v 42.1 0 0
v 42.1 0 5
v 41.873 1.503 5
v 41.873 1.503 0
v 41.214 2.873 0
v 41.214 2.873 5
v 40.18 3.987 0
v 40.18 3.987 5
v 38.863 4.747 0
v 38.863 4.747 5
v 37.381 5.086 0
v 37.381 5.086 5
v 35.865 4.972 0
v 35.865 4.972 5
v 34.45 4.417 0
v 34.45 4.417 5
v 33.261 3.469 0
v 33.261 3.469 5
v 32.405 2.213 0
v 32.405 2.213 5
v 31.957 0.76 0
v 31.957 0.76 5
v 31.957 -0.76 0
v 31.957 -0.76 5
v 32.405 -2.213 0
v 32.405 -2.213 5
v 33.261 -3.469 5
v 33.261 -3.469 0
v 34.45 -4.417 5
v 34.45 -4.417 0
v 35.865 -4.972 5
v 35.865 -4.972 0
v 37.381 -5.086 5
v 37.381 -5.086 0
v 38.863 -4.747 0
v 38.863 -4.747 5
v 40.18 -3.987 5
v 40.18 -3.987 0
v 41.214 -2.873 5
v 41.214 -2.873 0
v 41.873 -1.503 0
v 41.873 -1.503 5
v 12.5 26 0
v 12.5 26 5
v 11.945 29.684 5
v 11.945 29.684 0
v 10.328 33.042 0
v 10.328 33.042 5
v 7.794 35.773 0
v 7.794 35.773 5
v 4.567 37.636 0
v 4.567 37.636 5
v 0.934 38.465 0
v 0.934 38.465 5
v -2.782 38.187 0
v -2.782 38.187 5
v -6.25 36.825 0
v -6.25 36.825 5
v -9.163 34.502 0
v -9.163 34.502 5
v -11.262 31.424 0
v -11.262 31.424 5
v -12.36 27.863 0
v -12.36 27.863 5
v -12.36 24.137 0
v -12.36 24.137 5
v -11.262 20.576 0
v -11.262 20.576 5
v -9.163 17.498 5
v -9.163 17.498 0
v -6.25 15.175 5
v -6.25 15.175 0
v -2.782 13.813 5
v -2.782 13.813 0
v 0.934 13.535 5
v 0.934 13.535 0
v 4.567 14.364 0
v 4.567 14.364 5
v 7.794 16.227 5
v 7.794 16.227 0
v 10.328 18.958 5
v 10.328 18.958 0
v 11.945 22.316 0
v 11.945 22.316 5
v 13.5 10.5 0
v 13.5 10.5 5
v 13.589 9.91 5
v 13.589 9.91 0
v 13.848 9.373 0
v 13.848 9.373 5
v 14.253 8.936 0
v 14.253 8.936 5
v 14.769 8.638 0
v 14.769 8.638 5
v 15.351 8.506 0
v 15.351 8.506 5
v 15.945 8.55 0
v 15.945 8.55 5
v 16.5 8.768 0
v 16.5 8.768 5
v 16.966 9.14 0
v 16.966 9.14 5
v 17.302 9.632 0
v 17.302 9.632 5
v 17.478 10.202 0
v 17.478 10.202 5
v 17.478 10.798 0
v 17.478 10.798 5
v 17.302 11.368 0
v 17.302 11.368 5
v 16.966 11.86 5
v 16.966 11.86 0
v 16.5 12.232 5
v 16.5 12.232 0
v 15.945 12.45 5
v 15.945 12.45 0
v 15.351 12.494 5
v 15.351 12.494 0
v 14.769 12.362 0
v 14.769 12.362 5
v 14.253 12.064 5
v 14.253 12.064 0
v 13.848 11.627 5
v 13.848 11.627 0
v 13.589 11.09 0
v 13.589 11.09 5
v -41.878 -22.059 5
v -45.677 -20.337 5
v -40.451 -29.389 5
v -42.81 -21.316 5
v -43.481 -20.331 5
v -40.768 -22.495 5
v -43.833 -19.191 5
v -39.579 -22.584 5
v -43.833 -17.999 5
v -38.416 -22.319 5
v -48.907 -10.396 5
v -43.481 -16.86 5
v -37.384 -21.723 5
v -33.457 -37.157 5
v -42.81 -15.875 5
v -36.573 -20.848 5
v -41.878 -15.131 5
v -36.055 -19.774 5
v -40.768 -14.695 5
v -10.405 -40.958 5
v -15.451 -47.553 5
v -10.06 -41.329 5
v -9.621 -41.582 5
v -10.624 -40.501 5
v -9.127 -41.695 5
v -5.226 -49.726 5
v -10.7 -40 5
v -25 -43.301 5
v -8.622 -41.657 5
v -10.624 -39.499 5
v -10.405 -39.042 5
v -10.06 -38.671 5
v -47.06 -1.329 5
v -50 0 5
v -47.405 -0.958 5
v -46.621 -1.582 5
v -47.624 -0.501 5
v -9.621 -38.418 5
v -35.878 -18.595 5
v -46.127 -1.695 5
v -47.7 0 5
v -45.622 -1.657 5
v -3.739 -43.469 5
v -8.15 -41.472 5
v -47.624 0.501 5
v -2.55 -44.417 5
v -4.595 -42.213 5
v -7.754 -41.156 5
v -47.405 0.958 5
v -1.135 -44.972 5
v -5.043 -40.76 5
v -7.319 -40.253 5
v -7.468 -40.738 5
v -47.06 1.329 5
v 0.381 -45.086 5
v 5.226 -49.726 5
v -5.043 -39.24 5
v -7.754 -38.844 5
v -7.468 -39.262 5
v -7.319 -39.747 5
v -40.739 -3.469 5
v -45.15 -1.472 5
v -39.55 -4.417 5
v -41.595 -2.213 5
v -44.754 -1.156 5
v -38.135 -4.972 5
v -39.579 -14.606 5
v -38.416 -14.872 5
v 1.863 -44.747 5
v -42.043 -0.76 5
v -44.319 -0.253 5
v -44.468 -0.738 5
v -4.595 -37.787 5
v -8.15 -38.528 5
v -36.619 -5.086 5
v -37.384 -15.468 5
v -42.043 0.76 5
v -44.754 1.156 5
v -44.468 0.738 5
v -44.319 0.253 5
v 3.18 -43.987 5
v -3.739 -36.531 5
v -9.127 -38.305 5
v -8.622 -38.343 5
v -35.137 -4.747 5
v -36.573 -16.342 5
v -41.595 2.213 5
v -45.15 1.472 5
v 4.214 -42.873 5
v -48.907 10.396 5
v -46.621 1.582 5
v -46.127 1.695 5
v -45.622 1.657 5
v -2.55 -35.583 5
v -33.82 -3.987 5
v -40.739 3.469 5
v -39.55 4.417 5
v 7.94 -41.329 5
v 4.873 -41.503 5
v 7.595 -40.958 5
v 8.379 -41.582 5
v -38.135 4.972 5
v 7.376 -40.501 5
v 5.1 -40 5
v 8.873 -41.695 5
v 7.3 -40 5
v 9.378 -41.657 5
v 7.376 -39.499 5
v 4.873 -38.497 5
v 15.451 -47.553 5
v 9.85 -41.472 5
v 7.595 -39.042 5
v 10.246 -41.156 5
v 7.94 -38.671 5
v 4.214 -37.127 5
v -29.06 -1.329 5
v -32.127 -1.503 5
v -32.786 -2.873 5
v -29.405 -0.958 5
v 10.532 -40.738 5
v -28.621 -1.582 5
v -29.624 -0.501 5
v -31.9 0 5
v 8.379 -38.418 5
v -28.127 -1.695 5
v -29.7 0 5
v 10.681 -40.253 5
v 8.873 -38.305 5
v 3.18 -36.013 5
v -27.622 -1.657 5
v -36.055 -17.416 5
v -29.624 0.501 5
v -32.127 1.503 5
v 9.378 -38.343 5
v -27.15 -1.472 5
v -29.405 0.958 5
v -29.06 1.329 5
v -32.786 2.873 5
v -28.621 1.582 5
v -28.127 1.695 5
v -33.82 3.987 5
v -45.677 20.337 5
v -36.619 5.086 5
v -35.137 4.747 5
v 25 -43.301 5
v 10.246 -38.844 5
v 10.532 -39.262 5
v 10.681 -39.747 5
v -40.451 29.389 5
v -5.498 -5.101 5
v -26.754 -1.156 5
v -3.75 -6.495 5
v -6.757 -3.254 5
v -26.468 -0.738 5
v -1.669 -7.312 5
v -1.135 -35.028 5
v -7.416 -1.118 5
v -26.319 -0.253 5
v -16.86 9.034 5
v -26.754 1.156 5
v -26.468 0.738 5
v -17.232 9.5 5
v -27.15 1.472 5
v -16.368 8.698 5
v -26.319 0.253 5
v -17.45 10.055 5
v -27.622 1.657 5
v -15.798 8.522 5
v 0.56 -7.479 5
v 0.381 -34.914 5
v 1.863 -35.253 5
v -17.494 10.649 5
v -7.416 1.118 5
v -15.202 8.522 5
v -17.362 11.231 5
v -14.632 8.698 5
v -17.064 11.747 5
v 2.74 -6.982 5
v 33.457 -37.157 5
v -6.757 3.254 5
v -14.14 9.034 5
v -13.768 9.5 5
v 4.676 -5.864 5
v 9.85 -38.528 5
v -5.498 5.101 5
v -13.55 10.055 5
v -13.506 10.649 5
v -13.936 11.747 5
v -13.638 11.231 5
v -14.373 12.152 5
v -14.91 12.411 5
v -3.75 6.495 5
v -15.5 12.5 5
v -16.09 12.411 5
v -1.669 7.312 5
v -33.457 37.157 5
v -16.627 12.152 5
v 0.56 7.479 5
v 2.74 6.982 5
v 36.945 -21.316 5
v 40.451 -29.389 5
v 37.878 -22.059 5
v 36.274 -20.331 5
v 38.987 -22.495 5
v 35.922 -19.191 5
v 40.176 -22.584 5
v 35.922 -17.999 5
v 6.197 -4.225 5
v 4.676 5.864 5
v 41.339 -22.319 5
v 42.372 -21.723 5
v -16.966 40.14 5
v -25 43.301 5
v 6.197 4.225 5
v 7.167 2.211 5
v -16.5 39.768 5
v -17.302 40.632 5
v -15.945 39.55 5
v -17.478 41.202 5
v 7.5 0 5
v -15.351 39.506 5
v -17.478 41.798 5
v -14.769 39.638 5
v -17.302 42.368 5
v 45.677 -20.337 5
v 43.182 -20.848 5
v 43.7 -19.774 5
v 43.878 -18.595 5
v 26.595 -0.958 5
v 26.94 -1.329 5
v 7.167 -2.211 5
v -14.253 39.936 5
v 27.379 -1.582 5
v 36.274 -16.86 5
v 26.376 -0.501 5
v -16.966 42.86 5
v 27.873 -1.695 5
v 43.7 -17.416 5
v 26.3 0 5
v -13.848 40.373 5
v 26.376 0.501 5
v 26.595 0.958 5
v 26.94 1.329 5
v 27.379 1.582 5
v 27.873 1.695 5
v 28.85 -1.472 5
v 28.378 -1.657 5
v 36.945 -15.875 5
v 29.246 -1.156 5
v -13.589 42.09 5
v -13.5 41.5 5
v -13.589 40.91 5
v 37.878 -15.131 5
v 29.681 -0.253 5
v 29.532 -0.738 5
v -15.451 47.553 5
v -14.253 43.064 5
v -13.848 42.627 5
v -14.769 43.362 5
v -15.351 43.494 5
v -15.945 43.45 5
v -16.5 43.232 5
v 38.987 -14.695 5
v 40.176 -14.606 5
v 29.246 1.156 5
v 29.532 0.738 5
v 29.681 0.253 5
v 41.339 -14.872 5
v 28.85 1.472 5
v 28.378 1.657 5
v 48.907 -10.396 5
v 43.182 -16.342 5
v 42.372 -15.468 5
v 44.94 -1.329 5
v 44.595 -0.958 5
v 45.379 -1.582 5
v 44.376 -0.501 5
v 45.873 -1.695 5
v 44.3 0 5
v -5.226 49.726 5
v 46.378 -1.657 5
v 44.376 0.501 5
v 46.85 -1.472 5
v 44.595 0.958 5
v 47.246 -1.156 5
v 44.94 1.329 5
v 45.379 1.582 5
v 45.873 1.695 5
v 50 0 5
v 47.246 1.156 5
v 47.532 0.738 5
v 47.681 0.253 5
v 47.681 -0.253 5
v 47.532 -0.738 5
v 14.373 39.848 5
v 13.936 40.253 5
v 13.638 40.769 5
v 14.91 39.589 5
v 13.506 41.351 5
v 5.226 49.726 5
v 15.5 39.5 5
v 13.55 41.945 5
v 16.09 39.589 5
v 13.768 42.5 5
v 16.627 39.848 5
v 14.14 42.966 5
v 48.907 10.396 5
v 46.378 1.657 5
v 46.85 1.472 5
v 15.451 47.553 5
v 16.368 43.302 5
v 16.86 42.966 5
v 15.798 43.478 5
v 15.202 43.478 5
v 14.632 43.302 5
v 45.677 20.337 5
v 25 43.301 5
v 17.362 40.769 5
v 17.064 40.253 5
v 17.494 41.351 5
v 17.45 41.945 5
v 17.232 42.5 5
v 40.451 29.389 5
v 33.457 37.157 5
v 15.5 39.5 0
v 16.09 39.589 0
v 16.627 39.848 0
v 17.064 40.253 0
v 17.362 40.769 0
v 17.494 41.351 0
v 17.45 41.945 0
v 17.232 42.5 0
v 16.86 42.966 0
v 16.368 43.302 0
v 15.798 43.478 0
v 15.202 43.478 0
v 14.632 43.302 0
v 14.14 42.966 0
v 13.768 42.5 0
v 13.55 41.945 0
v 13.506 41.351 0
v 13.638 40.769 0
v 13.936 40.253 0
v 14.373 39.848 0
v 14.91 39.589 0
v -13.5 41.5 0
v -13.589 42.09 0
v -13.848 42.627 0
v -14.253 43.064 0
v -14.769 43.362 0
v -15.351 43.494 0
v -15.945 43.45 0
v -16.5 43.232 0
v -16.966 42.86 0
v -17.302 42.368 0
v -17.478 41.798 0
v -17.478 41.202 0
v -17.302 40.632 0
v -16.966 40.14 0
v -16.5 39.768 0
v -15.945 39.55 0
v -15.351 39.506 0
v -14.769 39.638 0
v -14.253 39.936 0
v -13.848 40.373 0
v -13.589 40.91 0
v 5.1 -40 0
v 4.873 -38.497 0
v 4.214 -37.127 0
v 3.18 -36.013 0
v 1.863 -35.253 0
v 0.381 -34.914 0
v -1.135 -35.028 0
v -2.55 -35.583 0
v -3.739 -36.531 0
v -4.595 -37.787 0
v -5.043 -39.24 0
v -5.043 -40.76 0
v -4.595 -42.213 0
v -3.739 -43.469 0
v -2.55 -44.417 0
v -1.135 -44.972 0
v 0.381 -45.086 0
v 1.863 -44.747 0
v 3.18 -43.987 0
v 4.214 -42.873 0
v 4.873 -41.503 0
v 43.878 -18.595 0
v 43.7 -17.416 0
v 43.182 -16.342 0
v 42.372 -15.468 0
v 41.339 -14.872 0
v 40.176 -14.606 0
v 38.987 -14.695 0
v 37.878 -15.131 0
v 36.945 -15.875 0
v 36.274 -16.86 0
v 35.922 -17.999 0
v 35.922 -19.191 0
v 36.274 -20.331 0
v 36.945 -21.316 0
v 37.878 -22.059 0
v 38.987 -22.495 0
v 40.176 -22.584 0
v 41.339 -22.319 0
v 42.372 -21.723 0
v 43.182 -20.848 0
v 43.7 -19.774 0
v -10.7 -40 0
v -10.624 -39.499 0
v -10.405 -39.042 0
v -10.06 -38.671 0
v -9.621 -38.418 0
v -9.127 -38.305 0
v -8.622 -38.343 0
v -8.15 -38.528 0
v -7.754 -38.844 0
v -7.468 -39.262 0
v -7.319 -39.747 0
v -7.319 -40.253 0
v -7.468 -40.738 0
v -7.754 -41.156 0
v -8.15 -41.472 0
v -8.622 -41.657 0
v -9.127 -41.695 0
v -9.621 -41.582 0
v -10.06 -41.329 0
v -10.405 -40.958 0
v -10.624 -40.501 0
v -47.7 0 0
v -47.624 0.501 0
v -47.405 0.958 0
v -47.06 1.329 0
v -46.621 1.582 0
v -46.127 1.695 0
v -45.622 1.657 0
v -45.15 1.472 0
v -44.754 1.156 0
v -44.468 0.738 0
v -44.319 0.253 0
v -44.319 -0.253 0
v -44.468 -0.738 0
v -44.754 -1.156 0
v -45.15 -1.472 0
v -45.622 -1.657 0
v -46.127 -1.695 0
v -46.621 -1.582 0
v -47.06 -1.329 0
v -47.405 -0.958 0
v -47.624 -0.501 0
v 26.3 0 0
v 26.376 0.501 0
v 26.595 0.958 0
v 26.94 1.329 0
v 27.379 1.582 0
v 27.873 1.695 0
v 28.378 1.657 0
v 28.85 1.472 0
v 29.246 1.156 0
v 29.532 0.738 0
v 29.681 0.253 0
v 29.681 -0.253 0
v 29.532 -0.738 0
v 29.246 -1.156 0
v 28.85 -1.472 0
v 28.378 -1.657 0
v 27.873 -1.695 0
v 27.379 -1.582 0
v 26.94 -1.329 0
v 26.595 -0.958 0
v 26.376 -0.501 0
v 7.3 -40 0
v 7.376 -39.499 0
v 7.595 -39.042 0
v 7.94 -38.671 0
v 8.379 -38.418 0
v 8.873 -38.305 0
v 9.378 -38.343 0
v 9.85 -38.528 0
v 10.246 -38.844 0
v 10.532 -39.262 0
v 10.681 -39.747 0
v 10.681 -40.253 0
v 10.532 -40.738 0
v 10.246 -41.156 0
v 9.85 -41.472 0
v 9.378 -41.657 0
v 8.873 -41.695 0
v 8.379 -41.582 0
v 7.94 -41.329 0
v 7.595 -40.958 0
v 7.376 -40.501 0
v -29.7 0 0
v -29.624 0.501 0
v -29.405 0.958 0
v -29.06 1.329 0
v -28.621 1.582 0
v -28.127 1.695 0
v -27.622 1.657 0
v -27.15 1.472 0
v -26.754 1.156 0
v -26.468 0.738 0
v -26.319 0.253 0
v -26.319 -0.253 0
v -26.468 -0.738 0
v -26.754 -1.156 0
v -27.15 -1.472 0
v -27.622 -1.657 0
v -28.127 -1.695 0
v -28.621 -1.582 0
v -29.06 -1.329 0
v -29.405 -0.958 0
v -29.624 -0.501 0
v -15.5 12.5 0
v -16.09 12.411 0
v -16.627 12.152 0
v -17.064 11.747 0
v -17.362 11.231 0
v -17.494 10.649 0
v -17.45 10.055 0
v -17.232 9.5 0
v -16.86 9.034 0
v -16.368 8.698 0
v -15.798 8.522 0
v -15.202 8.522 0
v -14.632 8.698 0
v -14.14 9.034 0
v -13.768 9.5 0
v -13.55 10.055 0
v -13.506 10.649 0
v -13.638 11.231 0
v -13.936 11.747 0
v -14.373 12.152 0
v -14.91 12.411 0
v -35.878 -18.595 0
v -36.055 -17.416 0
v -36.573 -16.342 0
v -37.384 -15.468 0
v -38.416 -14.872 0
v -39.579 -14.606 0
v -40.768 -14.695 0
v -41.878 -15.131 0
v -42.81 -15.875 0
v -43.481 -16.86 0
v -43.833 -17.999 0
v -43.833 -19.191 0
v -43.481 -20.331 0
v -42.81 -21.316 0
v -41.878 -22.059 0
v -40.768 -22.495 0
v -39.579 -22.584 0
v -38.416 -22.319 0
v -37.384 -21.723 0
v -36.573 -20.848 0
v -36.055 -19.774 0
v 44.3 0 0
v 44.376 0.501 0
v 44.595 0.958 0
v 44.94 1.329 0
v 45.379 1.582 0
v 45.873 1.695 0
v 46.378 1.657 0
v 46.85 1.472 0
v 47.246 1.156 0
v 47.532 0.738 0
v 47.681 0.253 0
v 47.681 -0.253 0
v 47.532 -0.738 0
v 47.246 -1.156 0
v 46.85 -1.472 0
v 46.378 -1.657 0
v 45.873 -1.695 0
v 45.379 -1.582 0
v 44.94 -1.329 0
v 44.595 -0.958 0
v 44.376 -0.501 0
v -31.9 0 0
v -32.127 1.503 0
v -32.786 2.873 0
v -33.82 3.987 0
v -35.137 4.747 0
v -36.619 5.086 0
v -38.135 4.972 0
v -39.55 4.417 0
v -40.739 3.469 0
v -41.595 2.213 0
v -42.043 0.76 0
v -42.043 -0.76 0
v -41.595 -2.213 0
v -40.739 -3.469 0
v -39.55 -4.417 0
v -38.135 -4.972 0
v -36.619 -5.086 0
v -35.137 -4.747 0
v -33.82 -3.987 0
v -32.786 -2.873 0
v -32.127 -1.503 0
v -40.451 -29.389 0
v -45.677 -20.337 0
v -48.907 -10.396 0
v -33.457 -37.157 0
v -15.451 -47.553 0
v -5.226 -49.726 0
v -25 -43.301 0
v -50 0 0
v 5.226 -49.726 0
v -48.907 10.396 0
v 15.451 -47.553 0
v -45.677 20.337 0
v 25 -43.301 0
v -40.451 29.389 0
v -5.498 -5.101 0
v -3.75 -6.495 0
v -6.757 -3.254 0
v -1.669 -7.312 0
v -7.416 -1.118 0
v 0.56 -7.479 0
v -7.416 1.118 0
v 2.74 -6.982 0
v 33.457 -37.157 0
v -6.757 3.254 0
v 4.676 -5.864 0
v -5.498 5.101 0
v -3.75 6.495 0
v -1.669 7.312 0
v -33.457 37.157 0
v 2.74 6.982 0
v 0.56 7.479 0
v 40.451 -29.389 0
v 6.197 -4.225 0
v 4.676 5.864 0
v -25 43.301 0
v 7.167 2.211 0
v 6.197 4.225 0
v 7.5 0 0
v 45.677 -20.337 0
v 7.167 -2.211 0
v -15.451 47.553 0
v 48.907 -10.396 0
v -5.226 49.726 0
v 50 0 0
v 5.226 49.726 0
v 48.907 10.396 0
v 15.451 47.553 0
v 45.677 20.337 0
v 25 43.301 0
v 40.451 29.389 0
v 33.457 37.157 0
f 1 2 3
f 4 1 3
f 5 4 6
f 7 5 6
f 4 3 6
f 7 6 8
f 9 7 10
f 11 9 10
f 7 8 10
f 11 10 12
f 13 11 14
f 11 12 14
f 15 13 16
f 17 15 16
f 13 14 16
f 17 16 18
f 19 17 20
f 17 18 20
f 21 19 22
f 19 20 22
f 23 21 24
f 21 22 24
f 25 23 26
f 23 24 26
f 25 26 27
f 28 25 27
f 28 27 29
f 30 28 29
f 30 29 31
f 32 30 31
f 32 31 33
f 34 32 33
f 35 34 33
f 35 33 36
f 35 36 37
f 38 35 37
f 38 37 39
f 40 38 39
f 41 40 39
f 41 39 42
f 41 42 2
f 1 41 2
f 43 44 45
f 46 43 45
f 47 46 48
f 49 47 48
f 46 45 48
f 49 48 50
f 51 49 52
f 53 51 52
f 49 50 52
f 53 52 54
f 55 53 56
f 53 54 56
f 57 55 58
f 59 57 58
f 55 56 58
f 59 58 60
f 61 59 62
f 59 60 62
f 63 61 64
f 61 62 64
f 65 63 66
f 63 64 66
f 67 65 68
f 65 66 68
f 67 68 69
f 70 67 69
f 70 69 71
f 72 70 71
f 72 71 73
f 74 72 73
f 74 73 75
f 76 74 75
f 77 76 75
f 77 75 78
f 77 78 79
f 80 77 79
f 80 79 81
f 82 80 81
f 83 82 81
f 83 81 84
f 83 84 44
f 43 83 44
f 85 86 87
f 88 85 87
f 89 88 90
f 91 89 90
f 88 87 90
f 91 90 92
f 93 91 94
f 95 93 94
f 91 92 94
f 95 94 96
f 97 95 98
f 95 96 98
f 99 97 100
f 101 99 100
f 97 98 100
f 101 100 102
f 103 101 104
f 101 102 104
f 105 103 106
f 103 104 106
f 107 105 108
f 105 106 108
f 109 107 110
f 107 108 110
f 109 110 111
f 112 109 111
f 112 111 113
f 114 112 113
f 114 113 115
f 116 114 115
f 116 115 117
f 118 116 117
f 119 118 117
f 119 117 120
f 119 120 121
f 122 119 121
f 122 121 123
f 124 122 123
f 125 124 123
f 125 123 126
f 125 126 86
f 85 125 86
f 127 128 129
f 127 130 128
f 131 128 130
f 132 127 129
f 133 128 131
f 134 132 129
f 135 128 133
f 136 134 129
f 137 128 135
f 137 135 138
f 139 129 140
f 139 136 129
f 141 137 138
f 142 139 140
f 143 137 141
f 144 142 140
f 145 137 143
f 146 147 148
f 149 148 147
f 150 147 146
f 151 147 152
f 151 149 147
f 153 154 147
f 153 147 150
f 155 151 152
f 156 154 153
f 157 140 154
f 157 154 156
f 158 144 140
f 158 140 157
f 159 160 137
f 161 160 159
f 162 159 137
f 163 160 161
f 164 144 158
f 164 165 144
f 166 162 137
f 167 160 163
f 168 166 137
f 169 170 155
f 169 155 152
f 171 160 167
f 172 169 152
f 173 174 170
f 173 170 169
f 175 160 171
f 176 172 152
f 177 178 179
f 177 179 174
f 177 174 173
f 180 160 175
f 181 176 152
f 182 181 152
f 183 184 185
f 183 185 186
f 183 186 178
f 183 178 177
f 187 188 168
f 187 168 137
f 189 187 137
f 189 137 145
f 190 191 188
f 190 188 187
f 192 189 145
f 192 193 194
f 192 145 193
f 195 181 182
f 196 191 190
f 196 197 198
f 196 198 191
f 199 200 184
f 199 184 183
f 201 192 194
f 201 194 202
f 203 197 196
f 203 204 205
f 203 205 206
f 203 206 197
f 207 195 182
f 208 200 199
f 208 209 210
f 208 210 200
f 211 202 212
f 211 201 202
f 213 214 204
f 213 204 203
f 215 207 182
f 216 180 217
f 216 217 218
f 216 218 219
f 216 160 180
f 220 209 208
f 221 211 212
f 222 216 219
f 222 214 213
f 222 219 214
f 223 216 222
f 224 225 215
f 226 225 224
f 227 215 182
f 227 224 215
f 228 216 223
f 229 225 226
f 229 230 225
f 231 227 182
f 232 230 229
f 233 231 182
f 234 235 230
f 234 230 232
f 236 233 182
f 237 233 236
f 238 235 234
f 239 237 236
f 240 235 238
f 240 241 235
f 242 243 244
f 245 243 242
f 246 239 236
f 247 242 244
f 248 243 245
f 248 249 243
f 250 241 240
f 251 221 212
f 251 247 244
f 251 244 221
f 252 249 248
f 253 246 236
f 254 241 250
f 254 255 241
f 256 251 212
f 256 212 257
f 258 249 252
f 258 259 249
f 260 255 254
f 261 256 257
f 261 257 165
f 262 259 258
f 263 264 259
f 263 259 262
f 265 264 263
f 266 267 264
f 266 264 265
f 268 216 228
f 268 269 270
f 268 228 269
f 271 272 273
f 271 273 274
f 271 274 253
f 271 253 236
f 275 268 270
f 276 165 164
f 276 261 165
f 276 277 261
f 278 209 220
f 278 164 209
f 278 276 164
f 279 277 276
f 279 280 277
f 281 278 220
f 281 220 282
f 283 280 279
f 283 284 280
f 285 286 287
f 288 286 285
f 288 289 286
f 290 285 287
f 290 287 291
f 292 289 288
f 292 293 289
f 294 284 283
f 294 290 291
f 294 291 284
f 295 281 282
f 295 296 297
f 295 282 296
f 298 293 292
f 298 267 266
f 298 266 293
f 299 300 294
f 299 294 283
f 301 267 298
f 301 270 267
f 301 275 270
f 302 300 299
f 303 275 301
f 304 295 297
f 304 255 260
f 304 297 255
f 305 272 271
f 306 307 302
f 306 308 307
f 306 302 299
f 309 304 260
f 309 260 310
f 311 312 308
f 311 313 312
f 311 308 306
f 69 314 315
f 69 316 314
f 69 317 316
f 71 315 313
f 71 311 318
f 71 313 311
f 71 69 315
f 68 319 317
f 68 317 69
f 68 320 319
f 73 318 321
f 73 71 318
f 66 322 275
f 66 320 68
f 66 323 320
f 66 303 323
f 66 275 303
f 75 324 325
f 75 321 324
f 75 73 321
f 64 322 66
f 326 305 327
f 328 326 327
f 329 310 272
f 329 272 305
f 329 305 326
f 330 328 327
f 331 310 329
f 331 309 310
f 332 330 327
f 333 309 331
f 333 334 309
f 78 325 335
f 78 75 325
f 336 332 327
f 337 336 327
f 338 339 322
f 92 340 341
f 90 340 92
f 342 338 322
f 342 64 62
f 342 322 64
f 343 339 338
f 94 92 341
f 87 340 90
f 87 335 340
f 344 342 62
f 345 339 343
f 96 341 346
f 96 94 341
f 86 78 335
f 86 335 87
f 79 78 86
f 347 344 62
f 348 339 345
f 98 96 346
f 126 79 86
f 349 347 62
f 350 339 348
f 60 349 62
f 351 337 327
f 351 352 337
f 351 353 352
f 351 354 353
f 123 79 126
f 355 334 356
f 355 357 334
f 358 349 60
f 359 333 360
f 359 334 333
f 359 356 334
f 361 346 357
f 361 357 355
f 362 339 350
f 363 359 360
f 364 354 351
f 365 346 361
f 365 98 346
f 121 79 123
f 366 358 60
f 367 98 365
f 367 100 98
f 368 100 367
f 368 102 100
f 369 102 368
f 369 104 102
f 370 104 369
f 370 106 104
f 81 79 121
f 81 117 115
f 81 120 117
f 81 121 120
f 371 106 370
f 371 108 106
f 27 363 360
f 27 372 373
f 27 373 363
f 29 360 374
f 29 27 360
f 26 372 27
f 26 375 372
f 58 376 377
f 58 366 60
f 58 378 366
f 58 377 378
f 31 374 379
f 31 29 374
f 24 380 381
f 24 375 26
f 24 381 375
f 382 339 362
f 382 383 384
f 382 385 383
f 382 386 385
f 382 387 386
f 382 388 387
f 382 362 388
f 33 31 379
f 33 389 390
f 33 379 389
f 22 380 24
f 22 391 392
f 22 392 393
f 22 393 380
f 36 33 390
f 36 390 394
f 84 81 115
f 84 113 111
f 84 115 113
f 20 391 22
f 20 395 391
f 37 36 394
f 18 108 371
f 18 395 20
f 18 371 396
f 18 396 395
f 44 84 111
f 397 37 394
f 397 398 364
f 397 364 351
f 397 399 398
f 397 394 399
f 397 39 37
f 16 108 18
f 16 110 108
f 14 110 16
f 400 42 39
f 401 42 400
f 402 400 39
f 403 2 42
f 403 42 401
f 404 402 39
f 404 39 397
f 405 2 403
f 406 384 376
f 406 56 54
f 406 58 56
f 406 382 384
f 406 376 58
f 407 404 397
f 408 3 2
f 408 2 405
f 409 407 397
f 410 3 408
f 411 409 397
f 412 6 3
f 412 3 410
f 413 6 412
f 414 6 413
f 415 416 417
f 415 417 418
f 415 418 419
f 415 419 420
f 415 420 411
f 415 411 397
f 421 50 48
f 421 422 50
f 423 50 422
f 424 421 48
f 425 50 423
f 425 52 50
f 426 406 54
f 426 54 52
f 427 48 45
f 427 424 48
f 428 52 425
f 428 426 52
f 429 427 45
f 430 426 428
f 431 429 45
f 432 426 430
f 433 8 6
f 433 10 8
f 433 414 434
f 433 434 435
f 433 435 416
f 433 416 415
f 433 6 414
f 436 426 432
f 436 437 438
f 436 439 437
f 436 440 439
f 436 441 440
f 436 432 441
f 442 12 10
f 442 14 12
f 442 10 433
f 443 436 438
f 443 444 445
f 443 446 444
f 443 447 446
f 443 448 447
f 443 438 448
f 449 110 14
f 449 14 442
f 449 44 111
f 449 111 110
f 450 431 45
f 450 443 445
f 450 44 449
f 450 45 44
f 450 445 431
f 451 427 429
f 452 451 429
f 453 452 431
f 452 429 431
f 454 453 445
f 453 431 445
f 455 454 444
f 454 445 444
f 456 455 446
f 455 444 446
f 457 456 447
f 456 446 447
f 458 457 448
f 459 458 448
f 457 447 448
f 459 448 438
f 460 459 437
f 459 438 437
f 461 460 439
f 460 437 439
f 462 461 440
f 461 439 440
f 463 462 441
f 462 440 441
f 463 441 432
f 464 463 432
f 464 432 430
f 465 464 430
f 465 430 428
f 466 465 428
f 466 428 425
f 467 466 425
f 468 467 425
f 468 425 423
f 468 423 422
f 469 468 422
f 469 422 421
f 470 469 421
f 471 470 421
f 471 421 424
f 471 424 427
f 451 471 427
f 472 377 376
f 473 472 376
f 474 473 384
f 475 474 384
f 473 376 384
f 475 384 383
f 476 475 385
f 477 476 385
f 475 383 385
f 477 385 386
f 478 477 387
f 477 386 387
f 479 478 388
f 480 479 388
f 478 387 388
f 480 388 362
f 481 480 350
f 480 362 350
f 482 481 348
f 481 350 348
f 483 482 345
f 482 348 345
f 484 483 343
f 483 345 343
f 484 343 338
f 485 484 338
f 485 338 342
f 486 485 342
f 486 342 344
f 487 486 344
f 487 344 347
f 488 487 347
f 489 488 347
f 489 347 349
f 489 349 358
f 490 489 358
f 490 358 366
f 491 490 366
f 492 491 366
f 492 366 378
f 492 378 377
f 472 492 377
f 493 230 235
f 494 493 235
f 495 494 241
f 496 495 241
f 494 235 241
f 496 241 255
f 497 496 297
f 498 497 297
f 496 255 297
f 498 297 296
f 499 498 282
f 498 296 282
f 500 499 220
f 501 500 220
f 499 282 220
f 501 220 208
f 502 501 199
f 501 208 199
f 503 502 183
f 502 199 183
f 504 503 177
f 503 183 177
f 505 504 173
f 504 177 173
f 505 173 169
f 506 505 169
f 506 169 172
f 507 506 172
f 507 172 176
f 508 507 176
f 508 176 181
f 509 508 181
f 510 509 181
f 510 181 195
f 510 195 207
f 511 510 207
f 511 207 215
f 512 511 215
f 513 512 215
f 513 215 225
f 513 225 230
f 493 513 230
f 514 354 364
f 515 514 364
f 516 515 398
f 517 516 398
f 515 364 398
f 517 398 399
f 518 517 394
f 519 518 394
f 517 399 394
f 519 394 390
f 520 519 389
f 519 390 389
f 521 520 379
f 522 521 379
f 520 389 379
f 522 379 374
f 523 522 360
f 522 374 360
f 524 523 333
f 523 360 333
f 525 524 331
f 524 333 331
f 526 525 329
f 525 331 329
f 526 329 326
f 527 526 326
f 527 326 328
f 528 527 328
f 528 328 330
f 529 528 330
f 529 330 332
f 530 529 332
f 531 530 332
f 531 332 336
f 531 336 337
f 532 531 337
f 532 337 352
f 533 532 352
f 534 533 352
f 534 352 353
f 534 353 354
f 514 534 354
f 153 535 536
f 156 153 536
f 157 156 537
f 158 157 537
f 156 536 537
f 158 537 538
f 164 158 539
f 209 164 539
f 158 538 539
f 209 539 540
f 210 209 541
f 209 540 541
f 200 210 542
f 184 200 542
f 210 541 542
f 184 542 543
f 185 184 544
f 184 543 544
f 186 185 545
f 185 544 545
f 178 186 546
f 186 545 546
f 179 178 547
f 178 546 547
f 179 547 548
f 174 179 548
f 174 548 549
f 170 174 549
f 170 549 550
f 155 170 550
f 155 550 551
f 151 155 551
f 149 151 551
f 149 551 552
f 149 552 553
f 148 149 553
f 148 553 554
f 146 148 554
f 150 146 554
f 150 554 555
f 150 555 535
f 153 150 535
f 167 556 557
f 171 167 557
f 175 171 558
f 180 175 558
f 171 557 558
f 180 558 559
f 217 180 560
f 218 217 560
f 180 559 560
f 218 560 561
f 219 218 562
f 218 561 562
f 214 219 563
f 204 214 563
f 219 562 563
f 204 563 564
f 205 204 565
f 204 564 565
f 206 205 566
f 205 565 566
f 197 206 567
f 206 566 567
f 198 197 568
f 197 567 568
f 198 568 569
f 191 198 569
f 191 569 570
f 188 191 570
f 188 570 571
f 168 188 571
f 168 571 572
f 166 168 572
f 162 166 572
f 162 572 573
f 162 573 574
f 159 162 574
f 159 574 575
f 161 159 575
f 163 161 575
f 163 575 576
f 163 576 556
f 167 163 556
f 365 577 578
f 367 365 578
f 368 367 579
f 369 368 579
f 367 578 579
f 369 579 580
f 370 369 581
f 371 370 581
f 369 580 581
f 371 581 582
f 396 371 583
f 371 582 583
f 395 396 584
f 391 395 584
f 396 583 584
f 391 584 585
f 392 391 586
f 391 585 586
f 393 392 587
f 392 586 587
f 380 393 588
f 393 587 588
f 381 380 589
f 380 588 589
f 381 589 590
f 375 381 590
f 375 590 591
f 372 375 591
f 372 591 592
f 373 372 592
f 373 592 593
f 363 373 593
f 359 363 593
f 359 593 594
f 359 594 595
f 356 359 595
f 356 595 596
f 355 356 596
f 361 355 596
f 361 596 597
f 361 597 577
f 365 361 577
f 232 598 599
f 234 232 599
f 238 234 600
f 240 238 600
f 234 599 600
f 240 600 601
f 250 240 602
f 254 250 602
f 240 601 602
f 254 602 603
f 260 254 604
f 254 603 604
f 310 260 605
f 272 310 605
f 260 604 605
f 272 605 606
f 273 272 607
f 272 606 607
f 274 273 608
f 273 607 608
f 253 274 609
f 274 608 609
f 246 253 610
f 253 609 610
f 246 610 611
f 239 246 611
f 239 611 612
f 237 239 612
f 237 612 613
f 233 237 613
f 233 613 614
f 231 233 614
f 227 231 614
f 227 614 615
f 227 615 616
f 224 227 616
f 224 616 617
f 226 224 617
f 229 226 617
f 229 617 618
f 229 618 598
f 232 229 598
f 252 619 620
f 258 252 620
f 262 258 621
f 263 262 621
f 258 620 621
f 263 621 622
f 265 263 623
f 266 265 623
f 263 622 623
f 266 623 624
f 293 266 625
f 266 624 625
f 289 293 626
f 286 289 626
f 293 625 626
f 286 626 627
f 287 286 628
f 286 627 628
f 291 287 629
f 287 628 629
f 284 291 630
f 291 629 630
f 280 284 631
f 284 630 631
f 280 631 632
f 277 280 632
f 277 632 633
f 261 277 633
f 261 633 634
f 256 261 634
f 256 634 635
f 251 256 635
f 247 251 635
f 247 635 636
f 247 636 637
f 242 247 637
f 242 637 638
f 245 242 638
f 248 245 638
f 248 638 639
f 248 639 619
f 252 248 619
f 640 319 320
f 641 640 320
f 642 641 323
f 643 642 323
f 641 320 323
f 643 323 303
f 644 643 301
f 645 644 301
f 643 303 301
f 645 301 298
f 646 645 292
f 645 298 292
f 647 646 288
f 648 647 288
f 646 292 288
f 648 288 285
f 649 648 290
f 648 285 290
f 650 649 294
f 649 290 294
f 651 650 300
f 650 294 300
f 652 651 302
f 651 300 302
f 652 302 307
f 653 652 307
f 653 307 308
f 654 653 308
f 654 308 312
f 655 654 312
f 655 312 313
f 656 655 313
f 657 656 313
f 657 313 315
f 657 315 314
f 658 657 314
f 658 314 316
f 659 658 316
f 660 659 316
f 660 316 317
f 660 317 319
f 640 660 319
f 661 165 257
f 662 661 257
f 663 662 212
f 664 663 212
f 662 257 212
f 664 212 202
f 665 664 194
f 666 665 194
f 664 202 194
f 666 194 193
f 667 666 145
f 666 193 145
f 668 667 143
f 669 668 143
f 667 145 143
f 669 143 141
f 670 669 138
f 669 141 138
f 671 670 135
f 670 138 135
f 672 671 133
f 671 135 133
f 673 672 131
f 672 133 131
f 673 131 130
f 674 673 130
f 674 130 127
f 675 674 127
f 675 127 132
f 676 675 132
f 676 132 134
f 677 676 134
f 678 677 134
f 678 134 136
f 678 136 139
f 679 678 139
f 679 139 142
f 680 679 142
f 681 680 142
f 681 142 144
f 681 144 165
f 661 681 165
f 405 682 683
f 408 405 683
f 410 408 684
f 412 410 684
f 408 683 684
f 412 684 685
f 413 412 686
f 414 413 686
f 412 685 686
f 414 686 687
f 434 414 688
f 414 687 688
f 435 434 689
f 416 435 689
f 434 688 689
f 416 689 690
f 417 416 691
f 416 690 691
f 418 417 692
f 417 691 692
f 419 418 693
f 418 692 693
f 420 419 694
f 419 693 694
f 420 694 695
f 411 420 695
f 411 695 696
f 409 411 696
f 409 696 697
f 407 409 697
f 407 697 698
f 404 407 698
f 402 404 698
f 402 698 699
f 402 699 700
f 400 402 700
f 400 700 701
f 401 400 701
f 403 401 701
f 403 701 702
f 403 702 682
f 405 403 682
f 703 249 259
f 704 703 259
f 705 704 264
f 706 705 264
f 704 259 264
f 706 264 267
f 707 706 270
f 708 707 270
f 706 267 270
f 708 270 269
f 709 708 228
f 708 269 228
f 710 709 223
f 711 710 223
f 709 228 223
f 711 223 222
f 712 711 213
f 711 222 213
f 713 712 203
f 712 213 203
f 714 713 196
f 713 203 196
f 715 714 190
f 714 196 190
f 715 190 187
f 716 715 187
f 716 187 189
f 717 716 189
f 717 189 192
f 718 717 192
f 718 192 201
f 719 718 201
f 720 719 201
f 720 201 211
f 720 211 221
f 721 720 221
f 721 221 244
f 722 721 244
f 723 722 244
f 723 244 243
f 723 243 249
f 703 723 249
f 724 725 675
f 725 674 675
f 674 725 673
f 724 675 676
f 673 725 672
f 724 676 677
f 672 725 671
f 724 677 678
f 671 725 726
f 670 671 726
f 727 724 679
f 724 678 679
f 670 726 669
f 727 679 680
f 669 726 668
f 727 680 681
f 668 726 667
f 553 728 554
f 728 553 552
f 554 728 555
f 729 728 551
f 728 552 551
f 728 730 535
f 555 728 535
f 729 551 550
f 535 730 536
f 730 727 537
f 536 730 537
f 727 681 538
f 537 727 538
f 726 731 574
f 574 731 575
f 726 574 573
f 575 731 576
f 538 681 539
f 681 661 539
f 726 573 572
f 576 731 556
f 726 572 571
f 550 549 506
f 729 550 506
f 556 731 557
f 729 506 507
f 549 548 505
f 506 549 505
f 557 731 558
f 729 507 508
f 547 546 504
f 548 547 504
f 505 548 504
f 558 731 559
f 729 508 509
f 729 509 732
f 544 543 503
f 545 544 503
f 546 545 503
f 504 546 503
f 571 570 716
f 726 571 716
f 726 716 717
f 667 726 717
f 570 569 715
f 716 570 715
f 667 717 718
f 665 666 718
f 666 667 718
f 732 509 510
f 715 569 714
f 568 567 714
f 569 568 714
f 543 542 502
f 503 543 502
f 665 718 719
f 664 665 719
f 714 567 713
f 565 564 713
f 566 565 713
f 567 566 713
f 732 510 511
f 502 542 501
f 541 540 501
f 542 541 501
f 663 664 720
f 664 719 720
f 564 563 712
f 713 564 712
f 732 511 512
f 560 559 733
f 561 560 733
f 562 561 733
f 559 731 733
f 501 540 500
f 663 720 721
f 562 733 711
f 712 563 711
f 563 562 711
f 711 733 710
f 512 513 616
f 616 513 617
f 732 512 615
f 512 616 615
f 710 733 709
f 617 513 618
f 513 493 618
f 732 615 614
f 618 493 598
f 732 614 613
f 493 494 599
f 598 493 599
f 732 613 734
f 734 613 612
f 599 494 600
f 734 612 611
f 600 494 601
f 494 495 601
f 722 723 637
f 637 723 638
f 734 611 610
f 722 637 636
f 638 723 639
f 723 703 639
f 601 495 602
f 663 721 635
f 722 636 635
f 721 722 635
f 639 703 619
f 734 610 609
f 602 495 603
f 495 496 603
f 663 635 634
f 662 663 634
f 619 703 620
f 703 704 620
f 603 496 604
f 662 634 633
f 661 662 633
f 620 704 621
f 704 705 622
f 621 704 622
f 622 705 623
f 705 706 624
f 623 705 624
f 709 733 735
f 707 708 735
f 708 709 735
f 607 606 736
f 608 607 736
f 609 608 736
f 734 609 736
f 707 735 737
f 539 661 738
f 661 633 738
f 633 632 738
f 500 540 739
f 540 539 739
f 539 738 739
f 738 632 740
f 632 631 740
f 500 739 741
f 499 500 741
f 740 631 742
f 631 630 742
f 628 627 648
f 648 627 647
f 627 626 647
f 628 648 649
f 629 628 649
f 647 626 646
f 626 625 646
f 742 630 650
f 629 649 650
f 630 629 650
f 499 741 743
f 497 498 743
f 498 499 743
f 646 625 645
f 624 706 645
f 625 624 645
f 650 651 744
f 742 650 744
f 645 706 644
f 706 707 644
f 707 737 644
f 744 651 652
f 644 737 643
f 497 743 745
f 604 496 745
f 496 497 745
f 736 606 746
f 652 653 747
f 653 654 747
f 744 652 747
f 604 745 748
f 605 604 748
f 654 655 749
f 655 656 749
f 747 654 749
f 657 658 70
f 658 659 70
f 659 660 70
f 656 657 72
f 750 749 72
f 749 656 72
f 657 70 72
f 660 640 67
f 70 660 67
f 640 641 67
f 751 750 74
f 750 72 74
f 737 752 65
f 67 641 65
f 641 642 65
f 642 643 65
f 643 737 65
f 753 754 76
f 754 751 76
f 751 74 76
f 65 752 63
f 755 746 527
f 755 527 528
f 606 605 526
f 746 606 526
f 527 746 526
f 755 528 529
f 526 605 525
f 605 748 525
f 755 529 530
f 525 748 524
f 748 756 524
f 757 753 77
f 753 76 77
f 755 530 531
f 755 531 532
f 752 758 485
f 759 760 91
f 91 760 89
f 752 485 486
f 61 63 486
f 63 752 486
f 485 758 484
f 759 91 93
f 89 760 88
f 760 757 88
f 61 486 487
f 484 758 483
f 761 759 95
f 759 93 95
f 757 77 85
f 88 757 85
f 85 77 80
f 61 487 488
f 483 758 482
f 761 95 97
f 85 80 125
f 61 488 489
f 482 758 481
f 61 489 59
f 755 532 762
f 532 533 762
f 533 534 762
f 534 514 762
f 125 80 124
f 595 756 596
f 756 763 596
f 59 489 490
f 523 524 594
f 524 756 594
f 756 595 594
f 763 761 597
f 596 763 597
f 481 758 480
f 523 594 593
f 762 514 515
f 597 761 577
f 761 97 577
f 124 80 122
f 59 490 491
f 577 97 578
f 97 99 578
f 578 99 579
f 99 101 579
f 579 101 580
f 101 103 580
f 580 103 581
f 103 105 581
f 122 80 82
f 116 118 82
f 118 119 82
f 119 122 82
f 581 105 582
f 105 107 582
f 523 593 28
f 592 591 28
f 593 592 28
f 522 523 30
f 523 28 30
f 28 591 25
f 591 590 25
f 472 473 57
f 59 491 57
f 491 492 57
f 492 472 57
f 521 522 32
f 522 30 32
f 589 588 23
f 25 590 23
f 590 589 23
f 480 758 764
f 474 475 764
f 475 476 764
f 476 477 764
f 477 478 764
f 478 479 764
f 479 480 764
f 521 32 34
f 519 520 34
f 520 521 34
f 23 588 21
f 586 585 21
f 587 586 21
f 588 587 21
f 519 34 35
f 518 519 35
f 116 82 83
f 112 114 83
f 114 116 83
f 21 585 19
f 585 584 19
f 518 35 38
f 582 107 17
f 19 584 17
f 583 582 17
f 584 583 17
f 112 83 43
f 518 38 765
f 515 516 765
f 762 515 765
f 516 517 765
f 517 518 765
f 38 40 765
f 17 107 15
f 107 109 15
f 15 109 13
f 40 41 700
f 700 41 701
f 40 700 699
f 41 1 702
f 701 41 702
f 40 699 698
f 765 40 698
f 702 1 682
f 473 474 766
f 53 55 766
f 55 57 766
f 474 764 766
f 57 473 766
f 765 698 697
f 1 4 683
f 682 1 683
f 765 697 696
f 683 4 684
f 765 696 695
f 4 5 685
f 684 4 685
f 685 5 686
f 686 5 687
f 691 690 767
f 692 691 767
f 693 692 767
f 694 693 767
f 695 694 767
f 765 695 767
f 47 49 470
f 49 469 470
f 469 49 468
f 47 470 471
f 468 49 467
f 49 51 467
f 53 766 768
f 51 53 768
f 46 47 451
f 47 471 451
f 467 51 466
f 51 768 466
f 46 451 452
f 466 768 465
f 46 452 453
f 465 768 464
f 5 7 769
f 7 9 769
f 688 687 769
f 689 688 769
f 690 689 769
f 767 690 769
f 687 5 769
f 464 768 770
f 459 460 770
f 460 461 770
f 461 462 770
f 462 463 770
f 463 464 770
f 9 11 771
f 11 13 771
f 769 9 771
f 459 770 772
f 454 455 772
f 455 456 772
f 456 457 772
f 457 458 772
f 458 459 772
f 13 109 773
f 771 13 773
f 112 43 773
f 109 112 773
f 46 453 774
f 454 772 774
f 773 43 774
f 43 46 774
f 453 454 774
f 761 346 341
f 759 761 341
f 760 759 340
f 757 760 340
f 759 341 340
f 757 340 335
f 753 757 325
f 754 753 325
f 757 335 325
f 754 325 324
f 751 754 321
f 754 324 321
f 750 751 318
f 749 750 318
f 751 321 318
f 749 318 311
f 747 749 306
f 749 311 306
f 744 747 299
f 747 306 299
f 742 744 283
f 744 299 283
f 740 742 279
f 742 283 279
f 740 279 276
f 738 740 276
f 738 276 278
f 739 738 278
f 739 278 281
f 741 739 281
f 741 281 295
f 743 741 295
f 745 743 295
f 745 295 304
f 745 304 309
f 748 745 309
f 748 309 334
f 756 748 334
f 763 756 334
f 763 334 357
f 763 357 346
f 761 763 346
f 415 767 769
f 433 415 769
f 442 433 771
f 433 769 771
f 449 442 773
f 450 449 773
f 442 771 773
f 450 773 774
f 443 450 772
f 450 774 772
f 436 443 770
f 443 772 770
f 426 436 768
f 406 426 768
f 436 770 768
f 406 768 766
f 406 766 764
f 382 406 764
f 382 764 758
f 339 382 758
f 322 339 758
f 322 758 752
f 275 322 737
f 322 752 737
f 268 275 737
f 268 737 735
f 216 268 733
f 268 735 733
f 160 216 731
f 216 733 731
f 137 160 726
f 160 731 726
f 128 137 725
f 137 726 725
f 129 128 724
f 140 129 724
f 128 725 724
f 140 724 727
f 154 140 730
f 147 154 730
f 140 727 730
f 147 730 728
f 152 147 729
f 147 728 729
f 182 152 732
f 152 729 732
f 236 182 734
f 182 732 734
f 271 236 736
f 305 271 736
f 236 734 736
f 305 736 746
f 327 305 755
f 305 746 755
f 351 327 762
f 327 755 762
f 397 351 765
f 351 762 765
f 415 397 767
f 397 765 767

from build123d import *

# Parameters (mm, degrees)
SKETCH1_R                    = 50
BOSS_EXTRUDE1_DEPTH          = 5
F_10_2_10_2_DIAMETER_HOLE1_D = 10.2
M3_CLEARANCE_HOLE1_D         = 3.4
SKETCH12_R                   = 12.5
CUT_EXTRUDE2_DEPTH           = 10
SKETCH13_R                   = 2
CUT_EXTRUDE3_DEPTH           = 10
CIRPATTERN1_COUNT            = 4
SKETCH14_R                   = 4
CUT_EXTRUDE4_DEPTH           = 10
SKETCH15_R                   = 7.5
CUT_EXTRUDE5_DEPTH           = 10


with BuildPart() as part:
    # Sketch1 → Boss-Extrude1 (new body)
    with BuildSketch(Plane.XY):
        Circle(SKETCH1_R)
    extrude(amount=BOSS_EXTRUDE1_DEPTH)

    # Ø10.2 (10.2) Diameter Hole1 (through all)
    with Locations(Plane(origin=(0, 0, 0), x_dir=(-1, 0, 0), z_dir=(0, 0, -1))):
        with Locations((37, 0), (-37, 0), (0, -40)):
            Hole(F_10_2_10_2_DIAMETER_HOLE1_D / 2)

    # M3 Clearance Hole1 (through all)
    with Locations(Plane.XY.offset(5)):
        with Locations((46, 0), (28, 0), (9, -40), (-9, -40), (-46, 0), (-28, 0)):
            Hole(M3_CLEARANCE_HOLE1_D / 2)

    # Sketch12 → Cut-Extrude2 (cut)
    with BuildSketch(Plane.XY.offset(5)):
        with Locations((0, 26)):
            Circle(SKETCH12_R)
    extrude(amount=-CUT_EXTRUDE2_DEPTH, mode=Mode.SUBTRACT)

    # Sketch13 → Cut-Extrude3 (cut)
    with BuildSketch(Plane.XY.offset(5)):
        with Locations((-15.5, 41.5)):
            Circle(SKETCH13_R)
    cut_extrude3 = extrude(amount=-CUT_EXTRUDE3_DEPTH, mode=Mode.SUBTRACT)

    # CirPattern1: Cut-Extrude3 ×4 about axis
    cirpattern1_axis = Axis((0, 26, 0), (0, 0, 1))
    for i in range(1, CIRPATTERN1_COUNT):
        add(cut_extrude3.rotate(cirpattern1_axis, i * 360 / CIRPATTERN1_COUNT), mode=Mode.SUBTRACT)

    # Sketch14 → Cut-Extrude4 (cut)
    with BuildSketch(Plane.XY.offset(5)):
        with Locations((-39.87754263, -18.595203517)):
            Circle(SKETCH14_R)
        with Locations((39.87754263, -18.595203517)):
            Circle(SKETCH14_R)
    extrude(amount=-CUT_EXTRUDE4_DEPTH, mode=Mode.SUBTRACT)

    # Sketch15 → Cut-Extrude5 (cut)
    with BuildSketch(Plane.XY.offset(5)):
        Circle(SKETCH15_R)
    extrude(amount=-CUT_EXTRUDE5_DEPTH, mode=Mode.SUBTRACT)


solid = part.part
